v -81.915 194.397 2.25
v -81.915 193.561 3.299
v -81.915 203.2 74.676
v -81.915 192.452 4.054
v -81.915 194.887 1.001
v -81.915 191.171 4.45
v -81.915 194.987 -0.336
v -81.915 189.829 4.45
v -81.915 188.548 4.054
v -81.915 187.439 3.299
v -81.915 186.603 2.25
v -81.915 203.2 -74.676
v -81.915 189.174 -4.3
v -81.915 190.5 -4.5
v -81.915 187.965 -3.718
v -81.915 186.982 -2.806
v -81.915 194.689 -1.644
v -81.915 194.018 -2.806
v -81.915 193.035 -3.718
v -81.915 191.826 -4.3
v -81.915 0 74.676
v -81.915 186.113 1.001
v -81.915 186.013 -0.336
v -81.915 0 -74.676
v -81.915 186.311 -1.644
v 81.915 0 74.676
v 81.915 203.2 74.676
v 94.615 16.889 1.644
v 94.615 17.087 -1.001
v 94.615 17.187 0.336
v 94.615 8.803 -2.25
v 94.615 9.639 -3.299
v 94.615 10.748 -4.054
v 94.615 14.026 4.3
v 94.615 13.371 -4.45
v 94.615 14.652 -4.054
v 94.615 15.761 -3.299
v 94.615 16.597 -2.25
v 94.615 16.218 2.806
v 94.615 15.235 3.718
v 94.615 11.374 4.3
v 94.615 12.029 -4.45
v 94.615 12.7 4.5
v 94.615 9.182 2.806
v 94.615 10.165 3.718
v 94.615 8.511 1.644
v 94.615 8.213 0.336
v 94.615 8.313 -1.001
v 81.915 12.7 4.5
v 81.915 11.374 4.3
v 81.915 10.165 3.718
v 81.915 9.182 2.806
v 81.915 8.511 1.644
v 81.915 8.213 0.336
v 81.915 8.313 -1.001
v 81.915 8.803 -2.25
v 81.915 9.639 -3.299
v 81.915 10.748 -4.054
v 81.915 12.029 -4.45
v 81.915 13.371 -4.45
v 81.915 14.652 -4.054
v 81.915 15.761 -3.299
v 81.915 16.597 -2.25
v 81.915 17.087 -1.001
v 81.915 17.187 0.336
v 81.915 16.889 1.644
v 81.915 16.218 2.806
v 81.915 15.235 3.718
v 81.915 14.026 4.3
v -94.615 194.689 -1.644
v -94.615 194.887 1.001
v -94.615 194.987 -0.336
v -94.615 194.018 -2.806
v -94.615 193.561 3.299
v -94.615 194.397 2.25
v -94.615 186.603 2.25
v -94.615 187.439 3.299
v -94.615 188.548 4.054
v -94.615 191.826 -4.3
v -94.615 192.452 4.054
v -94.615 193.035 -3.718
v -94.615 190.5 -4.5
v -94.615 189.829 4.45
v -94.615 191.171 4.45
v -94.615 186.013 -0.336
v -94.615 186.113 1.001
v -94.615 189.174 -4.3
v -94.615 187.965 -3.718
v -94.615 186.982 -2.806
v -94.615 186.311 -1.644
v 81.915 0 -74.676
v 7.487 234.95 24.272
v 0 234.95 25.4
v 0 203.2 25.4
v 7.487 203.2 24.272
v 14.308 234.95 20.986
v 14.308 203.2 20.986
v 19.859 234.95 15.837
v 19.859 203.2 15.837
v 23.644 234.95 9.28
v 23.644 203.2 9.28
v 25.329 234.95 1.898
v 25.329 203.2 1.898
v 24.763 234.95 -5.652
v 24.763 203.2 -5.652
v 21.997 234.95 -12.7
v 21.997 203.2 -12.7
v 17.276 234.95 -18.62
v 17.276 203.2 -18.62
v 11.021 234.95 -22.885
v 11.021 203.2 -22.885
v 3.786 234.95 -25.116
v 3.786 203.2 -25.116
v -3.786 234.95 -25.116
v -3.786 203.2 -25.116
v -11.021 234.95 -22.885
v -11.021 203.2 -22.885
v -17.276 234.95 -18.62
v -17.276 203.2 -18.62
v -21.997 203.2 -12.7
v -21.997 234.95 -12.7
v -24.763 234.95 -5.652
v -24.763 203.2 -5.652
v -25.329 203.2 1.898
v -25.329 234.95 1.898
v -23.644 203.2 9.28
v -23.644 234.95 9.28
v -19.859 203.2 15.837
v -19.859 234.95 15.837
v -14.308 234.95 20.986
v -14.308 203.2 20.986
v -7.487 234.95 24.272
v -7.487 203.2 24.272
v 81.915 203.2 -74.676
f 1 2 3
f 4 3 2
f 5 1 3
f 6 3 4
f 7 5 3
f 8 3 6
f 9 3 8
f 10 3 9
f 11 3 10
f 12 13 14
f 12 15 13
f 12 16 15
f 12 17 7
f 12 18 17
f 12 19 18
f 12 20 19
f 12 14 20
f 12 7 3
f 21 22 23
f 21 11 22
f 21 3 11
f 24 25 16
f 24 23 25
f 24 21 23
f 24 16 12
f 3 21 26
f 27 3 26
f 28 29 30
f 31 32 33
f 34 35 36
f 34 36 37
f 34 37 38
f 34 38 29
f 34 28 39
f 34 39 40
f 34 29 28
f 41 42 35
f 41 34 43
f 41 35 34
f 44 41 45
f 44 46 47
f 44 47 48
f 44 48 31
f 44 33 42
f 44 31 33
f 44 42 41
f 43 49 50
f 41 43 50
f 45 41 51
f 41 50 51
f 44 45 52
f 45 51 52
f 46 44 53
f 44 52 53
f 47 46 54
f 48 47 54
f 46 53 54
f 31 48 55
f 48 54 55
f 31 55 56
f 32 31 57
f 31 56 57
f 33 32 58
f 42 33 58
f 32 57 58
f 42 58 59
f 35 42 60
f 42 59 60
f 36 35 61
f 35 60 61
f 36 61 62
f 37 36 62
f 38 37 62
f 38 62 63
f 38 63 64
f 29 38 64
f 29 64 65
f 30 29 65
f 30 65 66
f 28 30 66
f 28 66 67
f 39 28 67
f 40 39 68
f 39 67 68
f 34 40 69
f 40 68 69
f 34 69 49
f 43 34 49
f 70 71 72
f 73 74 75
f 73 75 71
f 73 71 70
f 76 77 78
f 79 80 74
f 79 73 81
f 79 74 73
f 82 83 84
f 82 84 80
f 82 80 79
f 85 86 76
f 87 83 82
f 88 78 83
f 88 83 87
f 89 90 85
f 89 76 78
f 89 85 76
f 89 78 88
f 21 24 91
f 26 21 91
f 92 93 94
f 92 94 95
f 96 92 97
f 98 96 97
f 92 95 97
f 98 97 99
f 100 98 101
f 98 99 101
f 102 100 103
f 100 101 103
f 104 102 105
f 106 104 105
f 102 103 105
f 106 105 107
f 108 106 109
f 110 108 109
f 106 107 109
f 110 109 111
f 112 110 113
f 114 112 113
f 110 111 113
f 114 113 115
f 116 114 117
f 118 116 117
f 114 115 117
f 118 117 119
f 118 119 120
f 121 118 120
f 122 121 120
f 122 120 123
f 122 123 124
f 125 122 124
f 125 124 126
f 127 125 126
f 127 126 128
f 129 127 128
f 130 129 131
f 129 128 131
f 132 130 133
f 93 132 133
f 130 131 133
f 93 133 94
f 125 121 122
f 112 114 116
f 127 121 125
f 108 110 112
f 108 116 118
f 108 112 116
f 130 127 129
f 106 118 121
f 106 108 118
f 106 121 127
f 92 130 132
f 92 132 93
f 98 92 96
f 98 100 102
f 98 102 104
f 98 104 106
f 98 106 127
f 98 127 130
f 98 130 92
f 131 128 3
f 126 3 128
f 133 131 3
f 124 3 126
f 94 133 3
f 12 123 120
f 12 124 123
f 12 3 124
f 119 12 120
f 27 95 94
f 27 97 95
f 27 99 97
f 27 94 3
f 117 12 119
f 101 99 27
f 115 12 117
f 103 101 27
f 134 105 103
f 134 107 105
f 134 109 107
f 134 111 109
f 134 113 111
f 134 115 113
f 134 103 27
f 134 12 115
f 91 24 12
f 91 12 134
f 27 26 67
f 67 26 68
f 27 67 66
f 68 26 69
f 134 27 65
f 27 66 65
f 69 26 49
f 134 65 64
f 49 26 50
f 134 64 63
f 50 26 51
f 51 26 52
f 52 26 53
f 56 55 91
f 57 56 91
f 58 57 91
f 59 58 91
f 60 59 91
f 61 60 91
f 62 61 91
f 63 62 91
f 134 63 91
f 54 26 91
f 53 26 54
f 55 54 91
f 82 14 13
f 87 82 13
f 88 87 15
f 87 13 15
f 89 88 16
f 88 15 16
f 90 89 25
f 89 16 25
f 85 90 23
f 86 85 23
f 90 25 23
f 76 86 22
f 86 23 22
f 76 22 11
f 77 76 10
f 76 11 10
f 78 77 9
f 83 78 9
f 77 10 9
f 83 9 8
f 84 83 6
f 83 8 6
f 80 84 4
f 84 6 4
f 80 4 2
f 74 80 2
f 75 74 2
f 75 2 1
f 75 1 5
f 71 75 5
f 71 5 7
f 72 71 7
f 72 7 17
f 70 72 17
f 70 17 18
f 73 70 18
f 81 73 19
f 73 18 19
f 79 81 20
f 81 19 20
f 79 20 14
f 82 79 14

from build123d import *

# Parameters (mm, degrees)
SKETCH1_W           = 163.83
SKETCH1_H           = 149.352
BOSS_EXTRUDE1_DEPTH = 203.2
SKETCH2_R           = 25.4
BOSS_EXTRUDE2_DEPTH = 31.75
SKETCH3_R           = 4.5
BOSS_EXTRUDE3_DEPTH = 12.7
SKETCH5_R           = 4.5
BOSS_EXTRUDE4_DEPTH = 12.7


with BuildPart() as part:
    # Sketch1 → Boss-Extrude1 (new body)
    with BuildSketch(Plane(origin=(0, 0, 0), x_dir=(1, 0, 0), z_dir=(0, 1, 0))):
        Rectangle(SKETCH1_W, SKETCH1_H)
    extrude(amount=BOSS_EXTRUDE1_DEPTH)

    # Sketch2 → Boss-Extrude2 (add)
    with BuildSketch(Plane(origin=(0, 203.2, 0), x_dir=(1, 0, 0), z_dir=(0, 1, 0))):
        with Locations(Location((0, 0, 0), (0, 0, 270))):
            Circle(SKETCH2_R)
    extrude(amount=BOSS_EXTRUDE2_DEPTH)

    # Sketch3 → Boss-Extrude3 (add)
    with BuildSketch(Plane.ZY.offset(81.915)):
        with Locations(Location((0, 190.5, 0), (0, 0, 180))):
            Circle(SKETCH3_R)
    extrude(amount=BOSS_EXTRUDE3_DEPTH)

    # Sketch5 → Boss-Extrude4 (add)
    with BuildSketch(Plane(origin=(81.915, 0, 0), x_dir=(0, 0, -1), z_dir=(1, 0, 0))):
        with Locations(Location((0, 12.7, 0), (0, 0, 180))):
            Circle(SKETCH5_R)
    extrude(amount=BOSS_EXTRUDE4_DEPTH)


solid = part.part
